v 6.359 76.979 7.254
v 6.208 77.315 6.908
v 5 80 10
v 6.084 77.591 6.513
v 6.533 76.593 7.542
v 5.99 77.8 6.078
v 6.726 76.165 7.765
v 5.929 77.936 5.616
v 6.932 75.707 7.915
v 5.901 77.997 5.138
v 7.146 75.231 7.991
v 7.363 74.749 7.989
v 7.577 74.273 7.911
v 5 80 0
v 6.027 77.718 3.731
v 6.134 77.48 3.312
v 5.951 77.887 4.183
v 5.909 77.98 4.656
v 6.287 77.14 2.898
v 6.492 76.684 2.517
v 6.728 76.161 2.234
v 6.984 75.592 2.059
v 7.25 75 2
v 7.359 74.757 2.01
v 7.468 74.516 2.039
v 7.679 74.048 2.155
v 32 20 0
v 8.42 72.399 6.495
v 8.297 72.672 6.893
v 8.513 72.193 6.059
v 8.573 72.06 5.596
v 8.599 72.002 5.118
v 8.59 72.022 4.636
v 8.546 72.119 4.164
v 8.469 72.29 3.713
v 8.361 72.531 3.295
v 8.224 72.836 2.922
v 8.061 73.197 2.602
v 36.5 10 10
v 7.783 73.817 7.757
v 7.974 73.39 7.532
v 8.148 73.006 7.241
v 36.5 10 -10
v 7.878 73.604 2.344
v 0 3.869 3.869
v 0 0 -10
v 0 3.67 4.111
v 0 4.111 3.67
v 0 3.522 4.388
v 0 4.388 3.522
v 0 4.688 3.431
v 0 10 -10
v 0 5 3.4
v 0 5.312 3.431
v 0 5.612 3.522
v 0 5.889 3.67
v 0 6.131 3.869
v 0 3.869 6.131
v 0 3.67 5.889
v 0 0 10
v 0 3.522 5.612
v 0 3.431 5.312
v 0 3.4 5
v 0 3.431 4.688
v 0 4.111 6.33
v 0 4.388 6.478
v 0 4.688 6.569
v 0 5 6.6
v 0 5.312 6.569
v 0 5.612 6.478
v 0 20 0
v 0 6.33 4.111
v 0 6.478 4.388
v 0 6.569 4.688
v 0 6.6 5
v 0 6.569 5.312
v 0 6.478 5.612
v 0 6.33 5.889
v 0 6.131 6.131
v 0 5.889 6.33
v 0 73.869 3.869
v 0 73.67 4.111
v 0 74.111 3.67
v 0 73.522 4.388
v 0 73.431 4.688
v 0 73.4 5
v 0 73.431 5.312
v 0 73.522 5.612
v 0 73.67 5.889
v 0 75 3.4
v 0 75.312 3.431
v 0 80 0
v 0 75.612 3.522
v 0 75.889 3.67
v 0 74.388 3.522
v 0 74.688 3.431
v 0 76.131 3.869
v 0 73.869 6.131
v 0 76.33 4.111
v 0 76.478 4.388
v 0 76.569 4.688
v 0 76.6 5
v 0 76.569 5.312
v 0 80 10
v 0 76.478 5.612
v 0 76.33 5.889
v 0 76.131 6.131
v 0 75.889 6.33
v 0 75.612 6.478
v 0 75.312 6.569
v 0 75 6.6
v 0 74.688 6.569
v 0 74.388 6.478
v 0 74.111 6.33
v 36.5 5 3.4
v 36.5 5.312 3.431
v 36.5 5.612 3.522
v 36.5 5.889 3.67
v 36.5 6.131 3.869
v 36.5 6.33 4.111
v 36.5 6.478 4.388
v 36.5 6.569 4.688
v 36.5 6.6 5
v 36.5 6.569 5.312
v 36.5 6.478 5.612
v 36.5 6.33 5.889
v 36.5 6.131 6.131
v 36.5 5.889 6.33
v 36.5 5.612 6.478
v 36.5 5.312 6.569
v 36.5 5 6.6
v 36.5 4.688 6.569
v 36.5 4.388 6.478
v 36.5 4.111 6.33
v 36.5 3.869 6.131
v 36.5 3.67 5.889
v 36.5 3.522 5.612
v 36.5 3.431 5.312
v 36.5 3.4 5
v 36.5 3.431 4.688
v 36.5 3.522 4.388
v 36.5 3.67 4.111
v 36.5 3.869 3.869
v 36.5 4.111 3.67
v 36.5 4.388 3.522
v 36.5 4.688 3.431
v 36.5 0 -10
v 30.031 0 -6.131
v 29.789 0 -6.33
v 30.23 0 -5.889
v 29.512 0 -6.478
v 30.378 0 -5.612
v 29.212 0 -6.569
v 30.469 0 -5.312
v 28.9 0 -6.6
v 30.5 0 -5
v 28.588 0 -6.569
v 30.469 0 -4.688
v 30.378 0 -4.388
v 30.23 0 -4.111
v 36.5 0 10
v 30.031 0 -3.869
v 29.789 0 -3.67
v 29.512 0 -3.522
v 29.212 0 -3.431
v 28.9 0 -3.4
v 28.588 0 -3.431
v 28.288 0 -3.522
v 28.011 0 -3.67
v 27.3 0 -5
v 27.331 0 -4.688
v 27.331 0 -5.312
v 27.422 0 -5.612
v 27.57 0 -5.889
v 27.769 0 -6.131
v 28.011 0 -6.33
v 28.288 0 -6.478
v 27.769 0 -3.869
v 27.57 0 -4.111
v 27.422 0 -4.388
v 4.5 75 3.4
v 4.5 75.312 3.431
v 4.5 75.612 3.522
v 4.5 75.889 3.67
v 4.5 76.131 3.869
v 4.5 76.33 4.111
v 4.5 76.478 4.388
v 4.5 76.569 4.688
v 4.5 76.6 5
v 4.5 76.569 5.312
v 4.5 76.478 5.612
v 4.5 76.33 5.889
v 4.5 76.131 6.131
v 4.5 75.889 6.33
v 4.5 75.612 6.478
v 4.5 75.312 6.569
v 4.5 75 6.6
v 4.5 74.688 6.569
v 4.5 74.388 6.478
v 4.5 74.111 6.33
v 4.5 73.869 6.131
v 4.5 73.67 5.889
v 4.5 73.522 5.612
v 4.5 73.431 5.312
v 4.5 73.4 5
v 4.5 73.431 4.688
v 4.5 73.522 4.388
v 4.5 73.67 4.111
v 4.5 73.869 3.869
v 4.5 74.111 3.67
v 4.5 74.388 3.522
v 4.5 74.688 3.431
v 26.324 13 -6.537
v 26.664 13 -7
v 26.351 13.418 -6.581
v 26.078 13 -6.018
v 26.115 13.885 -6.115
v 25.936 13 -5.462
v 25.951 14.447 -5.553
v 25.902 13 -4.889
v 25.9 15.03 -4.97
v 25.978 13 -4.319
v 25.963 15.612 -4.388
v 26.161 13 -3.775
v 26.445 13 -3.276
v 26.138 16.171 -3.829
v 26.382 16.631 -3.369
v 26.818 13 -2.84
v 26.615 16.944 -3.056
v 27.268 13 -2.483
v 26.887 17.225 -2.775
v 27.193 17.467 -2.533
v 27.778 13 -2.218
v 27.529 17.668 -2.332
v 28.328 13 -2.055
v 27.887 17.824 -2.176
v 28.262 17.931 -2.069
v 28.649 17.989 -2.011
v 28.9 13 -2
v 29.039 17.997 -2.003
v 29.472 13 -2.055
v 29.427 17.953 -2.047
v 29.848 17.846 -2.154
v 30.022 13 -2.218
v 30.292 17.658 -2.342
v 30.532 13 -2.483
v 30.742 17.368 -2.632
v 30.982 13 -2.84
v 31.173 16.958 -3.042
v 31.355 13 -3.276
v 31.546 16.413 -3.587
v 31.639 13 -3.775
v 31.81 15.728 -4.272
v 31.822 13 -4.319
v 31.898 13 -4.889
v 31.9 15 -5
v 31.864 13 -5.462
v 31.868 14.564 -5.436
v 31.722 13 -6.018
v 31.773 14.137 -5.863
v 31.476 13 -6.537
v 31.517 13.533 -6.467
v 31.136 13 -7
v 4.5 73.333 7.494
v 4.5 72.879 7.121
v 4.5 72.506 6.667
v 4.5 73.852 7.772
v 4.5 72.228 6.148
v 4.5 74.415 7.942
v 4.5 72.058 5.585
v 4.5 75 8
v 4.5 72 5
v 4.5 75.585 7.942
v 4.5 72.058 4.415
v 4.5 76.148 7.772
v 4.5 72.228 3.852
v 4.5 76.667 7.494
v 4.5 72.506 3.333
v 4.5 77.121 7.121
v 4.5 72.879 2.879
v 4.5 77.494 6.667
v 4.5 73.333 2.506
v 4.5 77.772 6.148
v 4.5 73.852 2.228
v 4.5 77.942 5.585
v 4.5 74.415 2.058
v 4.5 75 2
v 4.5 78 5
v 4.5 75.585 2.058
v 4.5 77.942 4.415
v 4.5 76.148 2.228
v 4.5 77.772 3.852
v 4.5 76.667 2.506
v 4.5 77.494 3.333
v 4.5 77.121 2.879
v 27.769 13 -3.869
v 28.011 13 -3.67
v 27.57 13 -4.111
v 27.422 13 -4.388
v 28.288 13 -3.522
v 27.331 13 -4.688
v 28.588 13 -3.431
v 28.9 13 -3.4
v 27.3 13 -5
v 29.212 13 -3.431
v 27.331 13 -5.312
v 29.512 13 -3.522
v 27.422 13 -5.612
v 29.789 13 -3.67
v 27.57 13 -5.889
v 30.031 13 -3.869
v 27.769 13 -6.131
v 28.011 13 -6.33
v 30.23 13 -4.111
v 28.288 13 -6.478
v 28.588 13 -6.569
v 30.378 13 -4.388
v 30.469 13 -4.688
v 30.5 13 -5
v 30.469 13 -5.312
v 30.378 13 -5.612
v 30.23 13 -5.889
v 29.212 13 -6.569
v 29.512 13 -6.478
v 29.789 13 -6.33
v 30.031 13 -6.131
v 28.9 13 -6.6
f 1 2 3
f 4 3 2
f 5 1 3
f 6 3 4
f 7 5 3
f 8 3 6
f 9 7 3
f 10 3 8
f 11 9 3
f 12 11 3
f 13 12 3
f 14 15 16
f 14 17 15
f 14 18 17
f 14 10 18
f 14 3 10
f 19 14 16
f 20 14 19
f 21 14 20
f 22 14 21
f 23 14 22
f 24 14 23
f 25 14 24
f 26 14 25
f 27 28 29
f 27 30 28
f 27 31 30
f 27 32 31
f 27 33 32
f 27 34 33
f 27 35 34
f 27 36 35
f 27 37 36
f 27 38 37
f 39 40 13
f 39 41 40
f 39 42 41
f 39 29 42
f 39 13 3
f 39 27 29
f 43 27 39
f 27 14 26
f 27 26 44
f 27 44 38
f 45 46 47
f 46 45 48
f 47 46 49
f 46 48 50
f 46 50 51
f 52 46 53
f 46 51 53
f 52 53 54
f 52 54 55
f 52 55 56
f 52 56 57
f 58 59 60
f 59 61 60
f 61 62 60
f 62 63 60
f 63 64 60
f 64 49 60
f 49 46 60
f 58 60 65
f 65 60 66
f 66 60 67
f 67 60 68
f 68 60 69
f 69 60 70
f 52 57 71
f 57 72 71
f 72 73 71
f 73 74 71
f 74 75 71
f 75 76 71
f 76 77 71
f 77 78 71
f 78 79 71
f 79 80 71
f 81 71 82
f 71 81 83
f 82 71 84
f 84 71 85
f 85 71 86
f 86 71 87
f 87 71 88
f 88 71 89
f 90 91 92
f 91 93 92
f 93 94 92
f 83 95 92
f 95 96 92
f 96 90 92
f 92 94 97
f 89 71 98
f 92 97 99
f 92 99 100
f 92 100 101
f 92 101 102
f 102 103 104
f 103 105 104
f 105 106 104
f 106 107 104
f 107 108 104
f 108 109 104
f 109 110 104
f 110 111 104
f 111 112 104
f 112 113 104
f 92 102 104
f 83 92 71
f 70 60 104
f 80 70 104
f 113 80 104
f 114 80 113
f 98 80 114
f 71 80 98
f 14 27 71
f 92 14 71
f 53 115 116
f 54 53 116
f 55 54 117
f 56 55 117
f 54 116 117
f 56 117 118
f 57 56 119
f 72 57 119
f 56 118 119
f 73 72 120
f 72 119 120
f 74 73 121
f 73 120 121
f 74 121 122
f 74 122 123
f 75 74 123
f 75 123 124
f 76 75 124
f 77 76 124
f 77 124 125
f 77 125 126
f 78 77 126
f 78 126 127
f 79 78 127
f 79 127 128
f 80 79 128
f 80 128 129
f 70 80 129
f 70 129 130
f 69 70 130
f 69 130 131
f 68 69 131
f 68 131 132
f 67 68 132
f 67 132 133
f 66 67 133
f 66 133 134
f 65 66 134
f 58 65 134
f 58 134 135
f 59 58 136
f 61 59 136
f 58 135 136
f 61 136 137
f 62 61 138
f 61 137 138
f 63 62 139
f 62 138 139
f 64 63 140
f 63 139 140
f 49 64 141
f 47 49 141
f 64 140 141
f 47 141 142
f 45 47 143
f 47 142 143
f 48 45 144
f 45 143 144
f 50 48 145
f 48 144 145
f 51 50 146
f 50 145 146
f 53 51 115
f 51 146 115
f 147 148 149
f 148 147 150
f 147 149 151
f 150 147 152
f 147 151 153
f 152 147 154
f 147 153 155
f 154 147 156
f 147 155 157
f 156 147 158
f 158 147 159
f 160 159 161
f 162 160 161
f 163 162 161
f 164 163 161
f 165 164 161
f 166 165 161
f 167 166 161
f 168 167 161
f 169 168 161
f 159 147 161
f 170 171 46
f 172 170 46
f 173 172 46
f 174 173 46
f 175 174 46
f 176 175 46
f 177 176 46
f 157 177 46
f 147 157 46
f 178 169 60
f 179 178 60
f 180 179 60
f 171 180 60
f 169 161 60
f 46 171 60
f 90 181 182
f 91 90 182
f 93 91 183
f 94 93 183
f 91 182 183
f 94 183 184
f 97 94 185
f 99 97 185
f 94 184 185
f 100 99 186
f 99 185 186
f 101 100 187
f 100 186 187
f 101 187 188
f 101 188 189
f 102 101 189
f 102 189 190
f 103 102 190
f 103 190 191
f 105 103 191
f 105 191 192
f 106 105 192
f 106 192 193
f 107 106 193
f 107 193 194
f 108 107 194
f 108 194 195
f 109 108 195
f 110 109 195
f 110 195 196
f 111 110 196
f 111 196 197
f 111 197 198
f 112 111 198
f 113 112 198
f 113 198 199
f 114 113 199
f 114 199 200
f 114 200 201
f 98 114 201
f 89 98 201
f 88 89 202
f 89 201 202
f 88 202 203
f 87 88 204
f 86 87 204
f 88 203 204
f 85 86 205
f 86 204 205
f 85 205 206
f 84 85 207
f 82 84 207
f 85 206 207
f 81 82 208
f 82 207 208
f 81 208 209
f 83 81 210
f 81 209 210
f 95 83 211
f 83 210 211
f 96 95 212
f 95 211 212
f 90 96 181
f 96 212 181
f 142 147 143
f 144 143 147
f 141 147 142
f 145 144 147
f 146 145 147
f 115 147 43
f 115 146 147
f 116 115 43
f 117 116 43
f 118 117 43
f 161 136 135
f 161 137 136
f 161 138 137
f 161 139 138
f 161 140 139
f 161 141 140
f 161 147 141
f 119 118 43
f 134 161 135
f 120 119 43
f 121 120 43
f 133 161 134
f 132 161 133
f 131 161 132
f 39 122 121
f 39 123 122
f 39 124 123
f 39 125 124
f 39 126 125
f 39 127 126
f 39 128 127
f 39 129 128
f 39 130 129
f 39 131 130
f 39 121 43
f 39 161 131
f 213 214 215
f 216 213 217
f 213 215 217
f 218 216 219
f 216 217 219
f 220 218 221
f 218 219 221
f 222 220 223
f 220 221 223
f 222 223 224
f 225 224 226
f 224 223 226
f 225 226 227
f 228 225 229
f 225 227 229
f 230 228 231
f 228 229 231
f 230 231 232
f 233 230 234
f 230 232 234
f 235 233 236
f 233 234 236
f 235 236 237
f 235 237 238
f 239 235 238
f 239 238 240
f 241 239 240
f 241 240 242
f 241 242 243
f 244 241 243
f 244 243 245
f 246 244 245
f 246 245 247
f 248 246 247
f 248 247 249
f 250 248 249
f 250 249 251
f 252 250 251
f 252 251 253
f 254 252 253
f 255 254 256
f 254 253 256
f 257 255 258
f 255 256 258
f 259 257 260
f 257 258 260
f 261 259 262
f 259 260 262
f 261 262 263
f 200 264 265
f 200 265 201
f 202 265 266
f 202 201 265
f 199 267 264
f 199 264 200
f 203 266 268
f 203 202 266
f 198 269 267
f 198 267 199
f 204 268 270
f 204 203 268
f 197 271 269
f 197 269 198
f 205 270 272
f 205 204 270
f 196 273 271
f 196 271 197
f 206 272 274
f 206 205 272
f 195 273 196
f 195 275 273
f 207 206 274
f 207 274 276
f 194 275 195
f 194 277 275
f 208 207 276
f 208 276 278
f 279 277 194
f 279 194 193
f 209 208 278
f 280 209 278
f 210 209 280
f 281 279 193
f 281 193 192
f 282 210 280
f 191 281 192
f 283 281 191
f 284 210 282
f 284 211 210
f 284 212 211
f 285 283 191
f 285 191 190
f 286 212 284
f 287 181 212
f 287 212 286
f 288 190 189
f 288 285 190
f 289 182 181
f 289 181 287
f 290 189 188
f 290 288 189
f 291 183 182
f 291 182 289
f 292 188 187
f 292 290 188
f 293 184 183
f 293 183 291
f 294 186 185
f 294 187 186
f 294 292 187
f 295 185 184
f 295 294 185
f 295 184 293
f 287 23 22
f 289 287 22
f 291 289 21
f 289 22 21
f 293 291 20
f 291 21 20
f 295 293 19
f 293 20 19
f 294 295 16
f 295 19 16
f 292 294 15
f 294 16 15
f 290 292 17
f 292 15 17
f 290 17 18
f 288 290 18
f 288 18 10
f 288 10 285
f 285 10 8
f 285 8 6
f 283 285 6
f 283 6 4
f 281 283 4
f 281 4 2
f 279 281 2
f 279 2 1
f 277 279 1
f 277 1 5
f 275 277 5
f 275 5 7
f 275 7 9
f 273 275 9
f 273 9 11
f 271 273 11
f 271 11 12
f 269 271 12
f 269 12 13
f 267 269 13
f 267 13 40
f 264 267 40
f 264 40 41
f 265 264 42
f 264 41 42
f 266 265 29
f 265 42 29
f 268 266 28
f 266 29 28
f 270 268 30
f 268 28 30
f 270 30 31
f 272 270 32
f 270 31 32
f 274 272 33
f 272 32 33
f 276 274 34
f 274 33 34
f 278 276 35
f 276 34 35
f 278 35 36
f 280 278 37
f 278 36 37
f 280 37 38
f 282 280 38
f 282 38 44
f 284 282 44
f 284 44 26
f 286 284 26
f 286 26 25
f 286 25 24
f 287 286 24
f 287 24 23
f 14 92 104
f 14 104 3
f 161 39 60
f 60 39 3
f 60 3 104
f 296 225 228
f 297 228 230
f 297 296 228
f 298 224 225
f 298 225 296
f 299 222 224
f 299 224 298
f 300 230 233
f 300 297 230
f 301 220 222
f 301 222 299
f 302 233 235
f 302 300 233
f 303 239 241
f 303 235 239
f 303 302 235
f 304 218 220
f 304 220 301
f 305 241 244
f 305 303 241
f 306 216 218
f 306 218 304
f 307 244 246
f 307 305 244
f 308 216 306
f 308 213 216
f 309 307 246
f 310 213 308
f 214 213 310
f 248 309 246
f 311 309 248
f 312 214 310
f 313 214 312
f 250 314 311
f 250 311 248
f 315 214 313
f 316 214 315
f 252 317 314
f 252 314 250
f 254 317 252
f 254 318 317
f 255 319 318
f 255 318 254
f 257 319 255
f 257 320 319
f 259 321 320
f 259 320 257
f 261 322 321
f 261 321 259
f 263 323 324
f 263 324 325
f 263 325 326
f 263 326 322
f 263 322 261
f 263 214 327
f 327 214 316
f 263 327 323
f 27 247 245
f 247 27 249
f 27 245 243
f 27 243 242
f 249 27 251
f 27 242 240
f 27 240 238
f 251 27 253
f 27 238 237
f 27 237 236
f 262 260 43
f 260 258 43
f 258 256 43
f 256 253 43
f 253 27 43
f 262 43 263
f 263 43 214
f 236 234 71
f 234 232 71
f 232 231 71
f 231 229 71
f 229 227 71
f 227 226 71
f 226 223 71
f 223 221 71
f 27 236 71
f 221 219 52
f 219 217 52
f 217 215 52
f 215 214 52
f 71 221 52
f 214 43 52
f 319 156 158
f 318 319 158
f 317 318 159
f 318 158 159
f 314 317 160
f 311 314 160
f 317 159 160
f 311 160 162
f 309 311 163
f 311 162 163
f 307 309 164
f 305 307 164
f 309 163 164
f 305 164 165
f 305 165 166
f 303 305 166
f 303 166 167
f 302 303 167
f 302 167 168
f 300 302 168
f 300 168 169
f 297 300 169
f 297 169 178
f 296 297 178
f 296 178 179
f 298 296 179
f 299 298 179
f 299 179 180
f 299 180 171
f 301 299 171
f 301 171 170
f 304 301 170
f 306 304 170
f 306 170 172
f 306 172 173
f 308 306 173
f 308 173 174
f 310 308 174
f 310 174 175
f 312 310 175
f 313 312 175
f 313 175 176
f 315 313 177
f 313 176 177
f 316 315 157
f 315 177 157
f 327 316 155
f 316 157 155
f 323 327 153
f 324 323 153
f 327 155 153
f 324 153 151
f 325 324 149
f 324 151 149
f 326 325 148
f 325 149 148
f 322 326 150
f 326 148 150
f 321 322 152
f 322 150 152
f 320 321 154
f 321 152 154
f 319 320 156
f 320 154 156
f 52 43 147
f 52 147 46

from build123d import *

# Parameters (mm, degrees)
EXTRUDE_1_DEPTH     = 10
SKETCH_2_W          = 36.5
SKETCH_2_H          = 10
EXTRUDE_2_DEPTH     = 10
CHAMFER_1_SIZE      = 10
SKETCH_3_R          = 1.6
CUT_EXTRUDE_1_DEPTH = 89.5
SKETCH_4_R          = 1.6
CUT_EXTRUDE_2_DEPTH = 89.5
SKETCH_5_R          = 3
CUT_EXTRUDE_3_DEPTH = 32
SKETCH_6_R          = 3
CUT_EXTRUDE_4_DEPTH = 67


with BuildPart() as part:
    # ｽｹｯﾁ1 → ﾎﾞｽ - 押し出し1 (new body)
    with BuildSketch(Plane.XY):
        Polygon((0, 0), (0, 80), (5, 80), (36.5, 10), (36.5, 0), align=None)
    extrude(amount=EXTRUDE_1_DEPTH)

    # ｽｹｯﾁ2 → ﾎﾞｽ - 押し出し2 (add)
    with BuildSketch(Plane(origin=(0, 0, 0), x_dir=(-1, 0, 0), z_dir=(0, 0, -1))):
        with Locations((-18.25, 5)):
            Rectangle(SKETCH_2_W, SKETCH_2_H)
    extrude(amount=EXTRUDE_2_DEPTH)

    # 面取り1
    chamfer_1_edges = [part.edges().sort_by_distance(p)[0] for p in [
        (18.25, 10, 0),
    ]]
    chamfer(chamfer_1_edges, length=CHAMFER_1_SIZE - 0.0001)  # a hair under: the kernel refuses the full size

    # ｽｹｯﾁ3 → ｶｯﾄ - 押し出し1 (cut, through all)
    with BuildSketch(Plane(origin=(36.5, 0, 0), x_dir=(0, 0, -1), z_dir=(1, 0, 0))):
        with Locations((-5, 5)):
            Circle(SKETCH_3_R)
        with Locations((-5, 75)):
            Circle(SKETCH_3_R)
    extrude(amount=-CUT_EXTRUDE_1_DEPTH, mode=Mode.SUBTRACT)

    # ｽｹｯﾁ4 → ｶｯﾄ - 押し出し2 (cut, through all)
    with BuildSketch(Plane(origin=(0, 0, 0), x_dir=(-1, 0, 0), z_dir=(0, -1, 0))):
        with Locations(Location((-28.9, 5, 0), (0, 0, 180))):
            Circle(SKETCH_4_R)
    extrude(amount=-CUT_EXTRUDE_2_DEPTH, mode=Mode.SUBTRACT)

    # ｽｹｯﾁ5 → ｶｯﾄ - 押し出し3 (cut)
    with BuildSketch(Plane(origin=(36.5, 0, 0), x_dir=(0, 0, -1), z_dir=(1, 0, 0))):
        with Locations((-5, 75)):
            Circle(SKETCH_5_R)
    extrude(amount=-CUT_EXTRUDE_3_DEPTH, mode=Mode.SUBTRACT)

    # ｽｹｯﾁ6 → ｶｯﾄ - 押し出し4 (cut)
    with BuildSketch(Plane(origin=(0, 80, 0), x_dir=(1, 0, 0), z_dir=(0, 1, 0))):
        with Locations((28.9, 5)):
            Circle(SKETCH_6_R)
    extrude(amount=-CUT_EXTRUDE_4_DEPTH, mode=Mode.SUBTRACT)


solid = part.part
